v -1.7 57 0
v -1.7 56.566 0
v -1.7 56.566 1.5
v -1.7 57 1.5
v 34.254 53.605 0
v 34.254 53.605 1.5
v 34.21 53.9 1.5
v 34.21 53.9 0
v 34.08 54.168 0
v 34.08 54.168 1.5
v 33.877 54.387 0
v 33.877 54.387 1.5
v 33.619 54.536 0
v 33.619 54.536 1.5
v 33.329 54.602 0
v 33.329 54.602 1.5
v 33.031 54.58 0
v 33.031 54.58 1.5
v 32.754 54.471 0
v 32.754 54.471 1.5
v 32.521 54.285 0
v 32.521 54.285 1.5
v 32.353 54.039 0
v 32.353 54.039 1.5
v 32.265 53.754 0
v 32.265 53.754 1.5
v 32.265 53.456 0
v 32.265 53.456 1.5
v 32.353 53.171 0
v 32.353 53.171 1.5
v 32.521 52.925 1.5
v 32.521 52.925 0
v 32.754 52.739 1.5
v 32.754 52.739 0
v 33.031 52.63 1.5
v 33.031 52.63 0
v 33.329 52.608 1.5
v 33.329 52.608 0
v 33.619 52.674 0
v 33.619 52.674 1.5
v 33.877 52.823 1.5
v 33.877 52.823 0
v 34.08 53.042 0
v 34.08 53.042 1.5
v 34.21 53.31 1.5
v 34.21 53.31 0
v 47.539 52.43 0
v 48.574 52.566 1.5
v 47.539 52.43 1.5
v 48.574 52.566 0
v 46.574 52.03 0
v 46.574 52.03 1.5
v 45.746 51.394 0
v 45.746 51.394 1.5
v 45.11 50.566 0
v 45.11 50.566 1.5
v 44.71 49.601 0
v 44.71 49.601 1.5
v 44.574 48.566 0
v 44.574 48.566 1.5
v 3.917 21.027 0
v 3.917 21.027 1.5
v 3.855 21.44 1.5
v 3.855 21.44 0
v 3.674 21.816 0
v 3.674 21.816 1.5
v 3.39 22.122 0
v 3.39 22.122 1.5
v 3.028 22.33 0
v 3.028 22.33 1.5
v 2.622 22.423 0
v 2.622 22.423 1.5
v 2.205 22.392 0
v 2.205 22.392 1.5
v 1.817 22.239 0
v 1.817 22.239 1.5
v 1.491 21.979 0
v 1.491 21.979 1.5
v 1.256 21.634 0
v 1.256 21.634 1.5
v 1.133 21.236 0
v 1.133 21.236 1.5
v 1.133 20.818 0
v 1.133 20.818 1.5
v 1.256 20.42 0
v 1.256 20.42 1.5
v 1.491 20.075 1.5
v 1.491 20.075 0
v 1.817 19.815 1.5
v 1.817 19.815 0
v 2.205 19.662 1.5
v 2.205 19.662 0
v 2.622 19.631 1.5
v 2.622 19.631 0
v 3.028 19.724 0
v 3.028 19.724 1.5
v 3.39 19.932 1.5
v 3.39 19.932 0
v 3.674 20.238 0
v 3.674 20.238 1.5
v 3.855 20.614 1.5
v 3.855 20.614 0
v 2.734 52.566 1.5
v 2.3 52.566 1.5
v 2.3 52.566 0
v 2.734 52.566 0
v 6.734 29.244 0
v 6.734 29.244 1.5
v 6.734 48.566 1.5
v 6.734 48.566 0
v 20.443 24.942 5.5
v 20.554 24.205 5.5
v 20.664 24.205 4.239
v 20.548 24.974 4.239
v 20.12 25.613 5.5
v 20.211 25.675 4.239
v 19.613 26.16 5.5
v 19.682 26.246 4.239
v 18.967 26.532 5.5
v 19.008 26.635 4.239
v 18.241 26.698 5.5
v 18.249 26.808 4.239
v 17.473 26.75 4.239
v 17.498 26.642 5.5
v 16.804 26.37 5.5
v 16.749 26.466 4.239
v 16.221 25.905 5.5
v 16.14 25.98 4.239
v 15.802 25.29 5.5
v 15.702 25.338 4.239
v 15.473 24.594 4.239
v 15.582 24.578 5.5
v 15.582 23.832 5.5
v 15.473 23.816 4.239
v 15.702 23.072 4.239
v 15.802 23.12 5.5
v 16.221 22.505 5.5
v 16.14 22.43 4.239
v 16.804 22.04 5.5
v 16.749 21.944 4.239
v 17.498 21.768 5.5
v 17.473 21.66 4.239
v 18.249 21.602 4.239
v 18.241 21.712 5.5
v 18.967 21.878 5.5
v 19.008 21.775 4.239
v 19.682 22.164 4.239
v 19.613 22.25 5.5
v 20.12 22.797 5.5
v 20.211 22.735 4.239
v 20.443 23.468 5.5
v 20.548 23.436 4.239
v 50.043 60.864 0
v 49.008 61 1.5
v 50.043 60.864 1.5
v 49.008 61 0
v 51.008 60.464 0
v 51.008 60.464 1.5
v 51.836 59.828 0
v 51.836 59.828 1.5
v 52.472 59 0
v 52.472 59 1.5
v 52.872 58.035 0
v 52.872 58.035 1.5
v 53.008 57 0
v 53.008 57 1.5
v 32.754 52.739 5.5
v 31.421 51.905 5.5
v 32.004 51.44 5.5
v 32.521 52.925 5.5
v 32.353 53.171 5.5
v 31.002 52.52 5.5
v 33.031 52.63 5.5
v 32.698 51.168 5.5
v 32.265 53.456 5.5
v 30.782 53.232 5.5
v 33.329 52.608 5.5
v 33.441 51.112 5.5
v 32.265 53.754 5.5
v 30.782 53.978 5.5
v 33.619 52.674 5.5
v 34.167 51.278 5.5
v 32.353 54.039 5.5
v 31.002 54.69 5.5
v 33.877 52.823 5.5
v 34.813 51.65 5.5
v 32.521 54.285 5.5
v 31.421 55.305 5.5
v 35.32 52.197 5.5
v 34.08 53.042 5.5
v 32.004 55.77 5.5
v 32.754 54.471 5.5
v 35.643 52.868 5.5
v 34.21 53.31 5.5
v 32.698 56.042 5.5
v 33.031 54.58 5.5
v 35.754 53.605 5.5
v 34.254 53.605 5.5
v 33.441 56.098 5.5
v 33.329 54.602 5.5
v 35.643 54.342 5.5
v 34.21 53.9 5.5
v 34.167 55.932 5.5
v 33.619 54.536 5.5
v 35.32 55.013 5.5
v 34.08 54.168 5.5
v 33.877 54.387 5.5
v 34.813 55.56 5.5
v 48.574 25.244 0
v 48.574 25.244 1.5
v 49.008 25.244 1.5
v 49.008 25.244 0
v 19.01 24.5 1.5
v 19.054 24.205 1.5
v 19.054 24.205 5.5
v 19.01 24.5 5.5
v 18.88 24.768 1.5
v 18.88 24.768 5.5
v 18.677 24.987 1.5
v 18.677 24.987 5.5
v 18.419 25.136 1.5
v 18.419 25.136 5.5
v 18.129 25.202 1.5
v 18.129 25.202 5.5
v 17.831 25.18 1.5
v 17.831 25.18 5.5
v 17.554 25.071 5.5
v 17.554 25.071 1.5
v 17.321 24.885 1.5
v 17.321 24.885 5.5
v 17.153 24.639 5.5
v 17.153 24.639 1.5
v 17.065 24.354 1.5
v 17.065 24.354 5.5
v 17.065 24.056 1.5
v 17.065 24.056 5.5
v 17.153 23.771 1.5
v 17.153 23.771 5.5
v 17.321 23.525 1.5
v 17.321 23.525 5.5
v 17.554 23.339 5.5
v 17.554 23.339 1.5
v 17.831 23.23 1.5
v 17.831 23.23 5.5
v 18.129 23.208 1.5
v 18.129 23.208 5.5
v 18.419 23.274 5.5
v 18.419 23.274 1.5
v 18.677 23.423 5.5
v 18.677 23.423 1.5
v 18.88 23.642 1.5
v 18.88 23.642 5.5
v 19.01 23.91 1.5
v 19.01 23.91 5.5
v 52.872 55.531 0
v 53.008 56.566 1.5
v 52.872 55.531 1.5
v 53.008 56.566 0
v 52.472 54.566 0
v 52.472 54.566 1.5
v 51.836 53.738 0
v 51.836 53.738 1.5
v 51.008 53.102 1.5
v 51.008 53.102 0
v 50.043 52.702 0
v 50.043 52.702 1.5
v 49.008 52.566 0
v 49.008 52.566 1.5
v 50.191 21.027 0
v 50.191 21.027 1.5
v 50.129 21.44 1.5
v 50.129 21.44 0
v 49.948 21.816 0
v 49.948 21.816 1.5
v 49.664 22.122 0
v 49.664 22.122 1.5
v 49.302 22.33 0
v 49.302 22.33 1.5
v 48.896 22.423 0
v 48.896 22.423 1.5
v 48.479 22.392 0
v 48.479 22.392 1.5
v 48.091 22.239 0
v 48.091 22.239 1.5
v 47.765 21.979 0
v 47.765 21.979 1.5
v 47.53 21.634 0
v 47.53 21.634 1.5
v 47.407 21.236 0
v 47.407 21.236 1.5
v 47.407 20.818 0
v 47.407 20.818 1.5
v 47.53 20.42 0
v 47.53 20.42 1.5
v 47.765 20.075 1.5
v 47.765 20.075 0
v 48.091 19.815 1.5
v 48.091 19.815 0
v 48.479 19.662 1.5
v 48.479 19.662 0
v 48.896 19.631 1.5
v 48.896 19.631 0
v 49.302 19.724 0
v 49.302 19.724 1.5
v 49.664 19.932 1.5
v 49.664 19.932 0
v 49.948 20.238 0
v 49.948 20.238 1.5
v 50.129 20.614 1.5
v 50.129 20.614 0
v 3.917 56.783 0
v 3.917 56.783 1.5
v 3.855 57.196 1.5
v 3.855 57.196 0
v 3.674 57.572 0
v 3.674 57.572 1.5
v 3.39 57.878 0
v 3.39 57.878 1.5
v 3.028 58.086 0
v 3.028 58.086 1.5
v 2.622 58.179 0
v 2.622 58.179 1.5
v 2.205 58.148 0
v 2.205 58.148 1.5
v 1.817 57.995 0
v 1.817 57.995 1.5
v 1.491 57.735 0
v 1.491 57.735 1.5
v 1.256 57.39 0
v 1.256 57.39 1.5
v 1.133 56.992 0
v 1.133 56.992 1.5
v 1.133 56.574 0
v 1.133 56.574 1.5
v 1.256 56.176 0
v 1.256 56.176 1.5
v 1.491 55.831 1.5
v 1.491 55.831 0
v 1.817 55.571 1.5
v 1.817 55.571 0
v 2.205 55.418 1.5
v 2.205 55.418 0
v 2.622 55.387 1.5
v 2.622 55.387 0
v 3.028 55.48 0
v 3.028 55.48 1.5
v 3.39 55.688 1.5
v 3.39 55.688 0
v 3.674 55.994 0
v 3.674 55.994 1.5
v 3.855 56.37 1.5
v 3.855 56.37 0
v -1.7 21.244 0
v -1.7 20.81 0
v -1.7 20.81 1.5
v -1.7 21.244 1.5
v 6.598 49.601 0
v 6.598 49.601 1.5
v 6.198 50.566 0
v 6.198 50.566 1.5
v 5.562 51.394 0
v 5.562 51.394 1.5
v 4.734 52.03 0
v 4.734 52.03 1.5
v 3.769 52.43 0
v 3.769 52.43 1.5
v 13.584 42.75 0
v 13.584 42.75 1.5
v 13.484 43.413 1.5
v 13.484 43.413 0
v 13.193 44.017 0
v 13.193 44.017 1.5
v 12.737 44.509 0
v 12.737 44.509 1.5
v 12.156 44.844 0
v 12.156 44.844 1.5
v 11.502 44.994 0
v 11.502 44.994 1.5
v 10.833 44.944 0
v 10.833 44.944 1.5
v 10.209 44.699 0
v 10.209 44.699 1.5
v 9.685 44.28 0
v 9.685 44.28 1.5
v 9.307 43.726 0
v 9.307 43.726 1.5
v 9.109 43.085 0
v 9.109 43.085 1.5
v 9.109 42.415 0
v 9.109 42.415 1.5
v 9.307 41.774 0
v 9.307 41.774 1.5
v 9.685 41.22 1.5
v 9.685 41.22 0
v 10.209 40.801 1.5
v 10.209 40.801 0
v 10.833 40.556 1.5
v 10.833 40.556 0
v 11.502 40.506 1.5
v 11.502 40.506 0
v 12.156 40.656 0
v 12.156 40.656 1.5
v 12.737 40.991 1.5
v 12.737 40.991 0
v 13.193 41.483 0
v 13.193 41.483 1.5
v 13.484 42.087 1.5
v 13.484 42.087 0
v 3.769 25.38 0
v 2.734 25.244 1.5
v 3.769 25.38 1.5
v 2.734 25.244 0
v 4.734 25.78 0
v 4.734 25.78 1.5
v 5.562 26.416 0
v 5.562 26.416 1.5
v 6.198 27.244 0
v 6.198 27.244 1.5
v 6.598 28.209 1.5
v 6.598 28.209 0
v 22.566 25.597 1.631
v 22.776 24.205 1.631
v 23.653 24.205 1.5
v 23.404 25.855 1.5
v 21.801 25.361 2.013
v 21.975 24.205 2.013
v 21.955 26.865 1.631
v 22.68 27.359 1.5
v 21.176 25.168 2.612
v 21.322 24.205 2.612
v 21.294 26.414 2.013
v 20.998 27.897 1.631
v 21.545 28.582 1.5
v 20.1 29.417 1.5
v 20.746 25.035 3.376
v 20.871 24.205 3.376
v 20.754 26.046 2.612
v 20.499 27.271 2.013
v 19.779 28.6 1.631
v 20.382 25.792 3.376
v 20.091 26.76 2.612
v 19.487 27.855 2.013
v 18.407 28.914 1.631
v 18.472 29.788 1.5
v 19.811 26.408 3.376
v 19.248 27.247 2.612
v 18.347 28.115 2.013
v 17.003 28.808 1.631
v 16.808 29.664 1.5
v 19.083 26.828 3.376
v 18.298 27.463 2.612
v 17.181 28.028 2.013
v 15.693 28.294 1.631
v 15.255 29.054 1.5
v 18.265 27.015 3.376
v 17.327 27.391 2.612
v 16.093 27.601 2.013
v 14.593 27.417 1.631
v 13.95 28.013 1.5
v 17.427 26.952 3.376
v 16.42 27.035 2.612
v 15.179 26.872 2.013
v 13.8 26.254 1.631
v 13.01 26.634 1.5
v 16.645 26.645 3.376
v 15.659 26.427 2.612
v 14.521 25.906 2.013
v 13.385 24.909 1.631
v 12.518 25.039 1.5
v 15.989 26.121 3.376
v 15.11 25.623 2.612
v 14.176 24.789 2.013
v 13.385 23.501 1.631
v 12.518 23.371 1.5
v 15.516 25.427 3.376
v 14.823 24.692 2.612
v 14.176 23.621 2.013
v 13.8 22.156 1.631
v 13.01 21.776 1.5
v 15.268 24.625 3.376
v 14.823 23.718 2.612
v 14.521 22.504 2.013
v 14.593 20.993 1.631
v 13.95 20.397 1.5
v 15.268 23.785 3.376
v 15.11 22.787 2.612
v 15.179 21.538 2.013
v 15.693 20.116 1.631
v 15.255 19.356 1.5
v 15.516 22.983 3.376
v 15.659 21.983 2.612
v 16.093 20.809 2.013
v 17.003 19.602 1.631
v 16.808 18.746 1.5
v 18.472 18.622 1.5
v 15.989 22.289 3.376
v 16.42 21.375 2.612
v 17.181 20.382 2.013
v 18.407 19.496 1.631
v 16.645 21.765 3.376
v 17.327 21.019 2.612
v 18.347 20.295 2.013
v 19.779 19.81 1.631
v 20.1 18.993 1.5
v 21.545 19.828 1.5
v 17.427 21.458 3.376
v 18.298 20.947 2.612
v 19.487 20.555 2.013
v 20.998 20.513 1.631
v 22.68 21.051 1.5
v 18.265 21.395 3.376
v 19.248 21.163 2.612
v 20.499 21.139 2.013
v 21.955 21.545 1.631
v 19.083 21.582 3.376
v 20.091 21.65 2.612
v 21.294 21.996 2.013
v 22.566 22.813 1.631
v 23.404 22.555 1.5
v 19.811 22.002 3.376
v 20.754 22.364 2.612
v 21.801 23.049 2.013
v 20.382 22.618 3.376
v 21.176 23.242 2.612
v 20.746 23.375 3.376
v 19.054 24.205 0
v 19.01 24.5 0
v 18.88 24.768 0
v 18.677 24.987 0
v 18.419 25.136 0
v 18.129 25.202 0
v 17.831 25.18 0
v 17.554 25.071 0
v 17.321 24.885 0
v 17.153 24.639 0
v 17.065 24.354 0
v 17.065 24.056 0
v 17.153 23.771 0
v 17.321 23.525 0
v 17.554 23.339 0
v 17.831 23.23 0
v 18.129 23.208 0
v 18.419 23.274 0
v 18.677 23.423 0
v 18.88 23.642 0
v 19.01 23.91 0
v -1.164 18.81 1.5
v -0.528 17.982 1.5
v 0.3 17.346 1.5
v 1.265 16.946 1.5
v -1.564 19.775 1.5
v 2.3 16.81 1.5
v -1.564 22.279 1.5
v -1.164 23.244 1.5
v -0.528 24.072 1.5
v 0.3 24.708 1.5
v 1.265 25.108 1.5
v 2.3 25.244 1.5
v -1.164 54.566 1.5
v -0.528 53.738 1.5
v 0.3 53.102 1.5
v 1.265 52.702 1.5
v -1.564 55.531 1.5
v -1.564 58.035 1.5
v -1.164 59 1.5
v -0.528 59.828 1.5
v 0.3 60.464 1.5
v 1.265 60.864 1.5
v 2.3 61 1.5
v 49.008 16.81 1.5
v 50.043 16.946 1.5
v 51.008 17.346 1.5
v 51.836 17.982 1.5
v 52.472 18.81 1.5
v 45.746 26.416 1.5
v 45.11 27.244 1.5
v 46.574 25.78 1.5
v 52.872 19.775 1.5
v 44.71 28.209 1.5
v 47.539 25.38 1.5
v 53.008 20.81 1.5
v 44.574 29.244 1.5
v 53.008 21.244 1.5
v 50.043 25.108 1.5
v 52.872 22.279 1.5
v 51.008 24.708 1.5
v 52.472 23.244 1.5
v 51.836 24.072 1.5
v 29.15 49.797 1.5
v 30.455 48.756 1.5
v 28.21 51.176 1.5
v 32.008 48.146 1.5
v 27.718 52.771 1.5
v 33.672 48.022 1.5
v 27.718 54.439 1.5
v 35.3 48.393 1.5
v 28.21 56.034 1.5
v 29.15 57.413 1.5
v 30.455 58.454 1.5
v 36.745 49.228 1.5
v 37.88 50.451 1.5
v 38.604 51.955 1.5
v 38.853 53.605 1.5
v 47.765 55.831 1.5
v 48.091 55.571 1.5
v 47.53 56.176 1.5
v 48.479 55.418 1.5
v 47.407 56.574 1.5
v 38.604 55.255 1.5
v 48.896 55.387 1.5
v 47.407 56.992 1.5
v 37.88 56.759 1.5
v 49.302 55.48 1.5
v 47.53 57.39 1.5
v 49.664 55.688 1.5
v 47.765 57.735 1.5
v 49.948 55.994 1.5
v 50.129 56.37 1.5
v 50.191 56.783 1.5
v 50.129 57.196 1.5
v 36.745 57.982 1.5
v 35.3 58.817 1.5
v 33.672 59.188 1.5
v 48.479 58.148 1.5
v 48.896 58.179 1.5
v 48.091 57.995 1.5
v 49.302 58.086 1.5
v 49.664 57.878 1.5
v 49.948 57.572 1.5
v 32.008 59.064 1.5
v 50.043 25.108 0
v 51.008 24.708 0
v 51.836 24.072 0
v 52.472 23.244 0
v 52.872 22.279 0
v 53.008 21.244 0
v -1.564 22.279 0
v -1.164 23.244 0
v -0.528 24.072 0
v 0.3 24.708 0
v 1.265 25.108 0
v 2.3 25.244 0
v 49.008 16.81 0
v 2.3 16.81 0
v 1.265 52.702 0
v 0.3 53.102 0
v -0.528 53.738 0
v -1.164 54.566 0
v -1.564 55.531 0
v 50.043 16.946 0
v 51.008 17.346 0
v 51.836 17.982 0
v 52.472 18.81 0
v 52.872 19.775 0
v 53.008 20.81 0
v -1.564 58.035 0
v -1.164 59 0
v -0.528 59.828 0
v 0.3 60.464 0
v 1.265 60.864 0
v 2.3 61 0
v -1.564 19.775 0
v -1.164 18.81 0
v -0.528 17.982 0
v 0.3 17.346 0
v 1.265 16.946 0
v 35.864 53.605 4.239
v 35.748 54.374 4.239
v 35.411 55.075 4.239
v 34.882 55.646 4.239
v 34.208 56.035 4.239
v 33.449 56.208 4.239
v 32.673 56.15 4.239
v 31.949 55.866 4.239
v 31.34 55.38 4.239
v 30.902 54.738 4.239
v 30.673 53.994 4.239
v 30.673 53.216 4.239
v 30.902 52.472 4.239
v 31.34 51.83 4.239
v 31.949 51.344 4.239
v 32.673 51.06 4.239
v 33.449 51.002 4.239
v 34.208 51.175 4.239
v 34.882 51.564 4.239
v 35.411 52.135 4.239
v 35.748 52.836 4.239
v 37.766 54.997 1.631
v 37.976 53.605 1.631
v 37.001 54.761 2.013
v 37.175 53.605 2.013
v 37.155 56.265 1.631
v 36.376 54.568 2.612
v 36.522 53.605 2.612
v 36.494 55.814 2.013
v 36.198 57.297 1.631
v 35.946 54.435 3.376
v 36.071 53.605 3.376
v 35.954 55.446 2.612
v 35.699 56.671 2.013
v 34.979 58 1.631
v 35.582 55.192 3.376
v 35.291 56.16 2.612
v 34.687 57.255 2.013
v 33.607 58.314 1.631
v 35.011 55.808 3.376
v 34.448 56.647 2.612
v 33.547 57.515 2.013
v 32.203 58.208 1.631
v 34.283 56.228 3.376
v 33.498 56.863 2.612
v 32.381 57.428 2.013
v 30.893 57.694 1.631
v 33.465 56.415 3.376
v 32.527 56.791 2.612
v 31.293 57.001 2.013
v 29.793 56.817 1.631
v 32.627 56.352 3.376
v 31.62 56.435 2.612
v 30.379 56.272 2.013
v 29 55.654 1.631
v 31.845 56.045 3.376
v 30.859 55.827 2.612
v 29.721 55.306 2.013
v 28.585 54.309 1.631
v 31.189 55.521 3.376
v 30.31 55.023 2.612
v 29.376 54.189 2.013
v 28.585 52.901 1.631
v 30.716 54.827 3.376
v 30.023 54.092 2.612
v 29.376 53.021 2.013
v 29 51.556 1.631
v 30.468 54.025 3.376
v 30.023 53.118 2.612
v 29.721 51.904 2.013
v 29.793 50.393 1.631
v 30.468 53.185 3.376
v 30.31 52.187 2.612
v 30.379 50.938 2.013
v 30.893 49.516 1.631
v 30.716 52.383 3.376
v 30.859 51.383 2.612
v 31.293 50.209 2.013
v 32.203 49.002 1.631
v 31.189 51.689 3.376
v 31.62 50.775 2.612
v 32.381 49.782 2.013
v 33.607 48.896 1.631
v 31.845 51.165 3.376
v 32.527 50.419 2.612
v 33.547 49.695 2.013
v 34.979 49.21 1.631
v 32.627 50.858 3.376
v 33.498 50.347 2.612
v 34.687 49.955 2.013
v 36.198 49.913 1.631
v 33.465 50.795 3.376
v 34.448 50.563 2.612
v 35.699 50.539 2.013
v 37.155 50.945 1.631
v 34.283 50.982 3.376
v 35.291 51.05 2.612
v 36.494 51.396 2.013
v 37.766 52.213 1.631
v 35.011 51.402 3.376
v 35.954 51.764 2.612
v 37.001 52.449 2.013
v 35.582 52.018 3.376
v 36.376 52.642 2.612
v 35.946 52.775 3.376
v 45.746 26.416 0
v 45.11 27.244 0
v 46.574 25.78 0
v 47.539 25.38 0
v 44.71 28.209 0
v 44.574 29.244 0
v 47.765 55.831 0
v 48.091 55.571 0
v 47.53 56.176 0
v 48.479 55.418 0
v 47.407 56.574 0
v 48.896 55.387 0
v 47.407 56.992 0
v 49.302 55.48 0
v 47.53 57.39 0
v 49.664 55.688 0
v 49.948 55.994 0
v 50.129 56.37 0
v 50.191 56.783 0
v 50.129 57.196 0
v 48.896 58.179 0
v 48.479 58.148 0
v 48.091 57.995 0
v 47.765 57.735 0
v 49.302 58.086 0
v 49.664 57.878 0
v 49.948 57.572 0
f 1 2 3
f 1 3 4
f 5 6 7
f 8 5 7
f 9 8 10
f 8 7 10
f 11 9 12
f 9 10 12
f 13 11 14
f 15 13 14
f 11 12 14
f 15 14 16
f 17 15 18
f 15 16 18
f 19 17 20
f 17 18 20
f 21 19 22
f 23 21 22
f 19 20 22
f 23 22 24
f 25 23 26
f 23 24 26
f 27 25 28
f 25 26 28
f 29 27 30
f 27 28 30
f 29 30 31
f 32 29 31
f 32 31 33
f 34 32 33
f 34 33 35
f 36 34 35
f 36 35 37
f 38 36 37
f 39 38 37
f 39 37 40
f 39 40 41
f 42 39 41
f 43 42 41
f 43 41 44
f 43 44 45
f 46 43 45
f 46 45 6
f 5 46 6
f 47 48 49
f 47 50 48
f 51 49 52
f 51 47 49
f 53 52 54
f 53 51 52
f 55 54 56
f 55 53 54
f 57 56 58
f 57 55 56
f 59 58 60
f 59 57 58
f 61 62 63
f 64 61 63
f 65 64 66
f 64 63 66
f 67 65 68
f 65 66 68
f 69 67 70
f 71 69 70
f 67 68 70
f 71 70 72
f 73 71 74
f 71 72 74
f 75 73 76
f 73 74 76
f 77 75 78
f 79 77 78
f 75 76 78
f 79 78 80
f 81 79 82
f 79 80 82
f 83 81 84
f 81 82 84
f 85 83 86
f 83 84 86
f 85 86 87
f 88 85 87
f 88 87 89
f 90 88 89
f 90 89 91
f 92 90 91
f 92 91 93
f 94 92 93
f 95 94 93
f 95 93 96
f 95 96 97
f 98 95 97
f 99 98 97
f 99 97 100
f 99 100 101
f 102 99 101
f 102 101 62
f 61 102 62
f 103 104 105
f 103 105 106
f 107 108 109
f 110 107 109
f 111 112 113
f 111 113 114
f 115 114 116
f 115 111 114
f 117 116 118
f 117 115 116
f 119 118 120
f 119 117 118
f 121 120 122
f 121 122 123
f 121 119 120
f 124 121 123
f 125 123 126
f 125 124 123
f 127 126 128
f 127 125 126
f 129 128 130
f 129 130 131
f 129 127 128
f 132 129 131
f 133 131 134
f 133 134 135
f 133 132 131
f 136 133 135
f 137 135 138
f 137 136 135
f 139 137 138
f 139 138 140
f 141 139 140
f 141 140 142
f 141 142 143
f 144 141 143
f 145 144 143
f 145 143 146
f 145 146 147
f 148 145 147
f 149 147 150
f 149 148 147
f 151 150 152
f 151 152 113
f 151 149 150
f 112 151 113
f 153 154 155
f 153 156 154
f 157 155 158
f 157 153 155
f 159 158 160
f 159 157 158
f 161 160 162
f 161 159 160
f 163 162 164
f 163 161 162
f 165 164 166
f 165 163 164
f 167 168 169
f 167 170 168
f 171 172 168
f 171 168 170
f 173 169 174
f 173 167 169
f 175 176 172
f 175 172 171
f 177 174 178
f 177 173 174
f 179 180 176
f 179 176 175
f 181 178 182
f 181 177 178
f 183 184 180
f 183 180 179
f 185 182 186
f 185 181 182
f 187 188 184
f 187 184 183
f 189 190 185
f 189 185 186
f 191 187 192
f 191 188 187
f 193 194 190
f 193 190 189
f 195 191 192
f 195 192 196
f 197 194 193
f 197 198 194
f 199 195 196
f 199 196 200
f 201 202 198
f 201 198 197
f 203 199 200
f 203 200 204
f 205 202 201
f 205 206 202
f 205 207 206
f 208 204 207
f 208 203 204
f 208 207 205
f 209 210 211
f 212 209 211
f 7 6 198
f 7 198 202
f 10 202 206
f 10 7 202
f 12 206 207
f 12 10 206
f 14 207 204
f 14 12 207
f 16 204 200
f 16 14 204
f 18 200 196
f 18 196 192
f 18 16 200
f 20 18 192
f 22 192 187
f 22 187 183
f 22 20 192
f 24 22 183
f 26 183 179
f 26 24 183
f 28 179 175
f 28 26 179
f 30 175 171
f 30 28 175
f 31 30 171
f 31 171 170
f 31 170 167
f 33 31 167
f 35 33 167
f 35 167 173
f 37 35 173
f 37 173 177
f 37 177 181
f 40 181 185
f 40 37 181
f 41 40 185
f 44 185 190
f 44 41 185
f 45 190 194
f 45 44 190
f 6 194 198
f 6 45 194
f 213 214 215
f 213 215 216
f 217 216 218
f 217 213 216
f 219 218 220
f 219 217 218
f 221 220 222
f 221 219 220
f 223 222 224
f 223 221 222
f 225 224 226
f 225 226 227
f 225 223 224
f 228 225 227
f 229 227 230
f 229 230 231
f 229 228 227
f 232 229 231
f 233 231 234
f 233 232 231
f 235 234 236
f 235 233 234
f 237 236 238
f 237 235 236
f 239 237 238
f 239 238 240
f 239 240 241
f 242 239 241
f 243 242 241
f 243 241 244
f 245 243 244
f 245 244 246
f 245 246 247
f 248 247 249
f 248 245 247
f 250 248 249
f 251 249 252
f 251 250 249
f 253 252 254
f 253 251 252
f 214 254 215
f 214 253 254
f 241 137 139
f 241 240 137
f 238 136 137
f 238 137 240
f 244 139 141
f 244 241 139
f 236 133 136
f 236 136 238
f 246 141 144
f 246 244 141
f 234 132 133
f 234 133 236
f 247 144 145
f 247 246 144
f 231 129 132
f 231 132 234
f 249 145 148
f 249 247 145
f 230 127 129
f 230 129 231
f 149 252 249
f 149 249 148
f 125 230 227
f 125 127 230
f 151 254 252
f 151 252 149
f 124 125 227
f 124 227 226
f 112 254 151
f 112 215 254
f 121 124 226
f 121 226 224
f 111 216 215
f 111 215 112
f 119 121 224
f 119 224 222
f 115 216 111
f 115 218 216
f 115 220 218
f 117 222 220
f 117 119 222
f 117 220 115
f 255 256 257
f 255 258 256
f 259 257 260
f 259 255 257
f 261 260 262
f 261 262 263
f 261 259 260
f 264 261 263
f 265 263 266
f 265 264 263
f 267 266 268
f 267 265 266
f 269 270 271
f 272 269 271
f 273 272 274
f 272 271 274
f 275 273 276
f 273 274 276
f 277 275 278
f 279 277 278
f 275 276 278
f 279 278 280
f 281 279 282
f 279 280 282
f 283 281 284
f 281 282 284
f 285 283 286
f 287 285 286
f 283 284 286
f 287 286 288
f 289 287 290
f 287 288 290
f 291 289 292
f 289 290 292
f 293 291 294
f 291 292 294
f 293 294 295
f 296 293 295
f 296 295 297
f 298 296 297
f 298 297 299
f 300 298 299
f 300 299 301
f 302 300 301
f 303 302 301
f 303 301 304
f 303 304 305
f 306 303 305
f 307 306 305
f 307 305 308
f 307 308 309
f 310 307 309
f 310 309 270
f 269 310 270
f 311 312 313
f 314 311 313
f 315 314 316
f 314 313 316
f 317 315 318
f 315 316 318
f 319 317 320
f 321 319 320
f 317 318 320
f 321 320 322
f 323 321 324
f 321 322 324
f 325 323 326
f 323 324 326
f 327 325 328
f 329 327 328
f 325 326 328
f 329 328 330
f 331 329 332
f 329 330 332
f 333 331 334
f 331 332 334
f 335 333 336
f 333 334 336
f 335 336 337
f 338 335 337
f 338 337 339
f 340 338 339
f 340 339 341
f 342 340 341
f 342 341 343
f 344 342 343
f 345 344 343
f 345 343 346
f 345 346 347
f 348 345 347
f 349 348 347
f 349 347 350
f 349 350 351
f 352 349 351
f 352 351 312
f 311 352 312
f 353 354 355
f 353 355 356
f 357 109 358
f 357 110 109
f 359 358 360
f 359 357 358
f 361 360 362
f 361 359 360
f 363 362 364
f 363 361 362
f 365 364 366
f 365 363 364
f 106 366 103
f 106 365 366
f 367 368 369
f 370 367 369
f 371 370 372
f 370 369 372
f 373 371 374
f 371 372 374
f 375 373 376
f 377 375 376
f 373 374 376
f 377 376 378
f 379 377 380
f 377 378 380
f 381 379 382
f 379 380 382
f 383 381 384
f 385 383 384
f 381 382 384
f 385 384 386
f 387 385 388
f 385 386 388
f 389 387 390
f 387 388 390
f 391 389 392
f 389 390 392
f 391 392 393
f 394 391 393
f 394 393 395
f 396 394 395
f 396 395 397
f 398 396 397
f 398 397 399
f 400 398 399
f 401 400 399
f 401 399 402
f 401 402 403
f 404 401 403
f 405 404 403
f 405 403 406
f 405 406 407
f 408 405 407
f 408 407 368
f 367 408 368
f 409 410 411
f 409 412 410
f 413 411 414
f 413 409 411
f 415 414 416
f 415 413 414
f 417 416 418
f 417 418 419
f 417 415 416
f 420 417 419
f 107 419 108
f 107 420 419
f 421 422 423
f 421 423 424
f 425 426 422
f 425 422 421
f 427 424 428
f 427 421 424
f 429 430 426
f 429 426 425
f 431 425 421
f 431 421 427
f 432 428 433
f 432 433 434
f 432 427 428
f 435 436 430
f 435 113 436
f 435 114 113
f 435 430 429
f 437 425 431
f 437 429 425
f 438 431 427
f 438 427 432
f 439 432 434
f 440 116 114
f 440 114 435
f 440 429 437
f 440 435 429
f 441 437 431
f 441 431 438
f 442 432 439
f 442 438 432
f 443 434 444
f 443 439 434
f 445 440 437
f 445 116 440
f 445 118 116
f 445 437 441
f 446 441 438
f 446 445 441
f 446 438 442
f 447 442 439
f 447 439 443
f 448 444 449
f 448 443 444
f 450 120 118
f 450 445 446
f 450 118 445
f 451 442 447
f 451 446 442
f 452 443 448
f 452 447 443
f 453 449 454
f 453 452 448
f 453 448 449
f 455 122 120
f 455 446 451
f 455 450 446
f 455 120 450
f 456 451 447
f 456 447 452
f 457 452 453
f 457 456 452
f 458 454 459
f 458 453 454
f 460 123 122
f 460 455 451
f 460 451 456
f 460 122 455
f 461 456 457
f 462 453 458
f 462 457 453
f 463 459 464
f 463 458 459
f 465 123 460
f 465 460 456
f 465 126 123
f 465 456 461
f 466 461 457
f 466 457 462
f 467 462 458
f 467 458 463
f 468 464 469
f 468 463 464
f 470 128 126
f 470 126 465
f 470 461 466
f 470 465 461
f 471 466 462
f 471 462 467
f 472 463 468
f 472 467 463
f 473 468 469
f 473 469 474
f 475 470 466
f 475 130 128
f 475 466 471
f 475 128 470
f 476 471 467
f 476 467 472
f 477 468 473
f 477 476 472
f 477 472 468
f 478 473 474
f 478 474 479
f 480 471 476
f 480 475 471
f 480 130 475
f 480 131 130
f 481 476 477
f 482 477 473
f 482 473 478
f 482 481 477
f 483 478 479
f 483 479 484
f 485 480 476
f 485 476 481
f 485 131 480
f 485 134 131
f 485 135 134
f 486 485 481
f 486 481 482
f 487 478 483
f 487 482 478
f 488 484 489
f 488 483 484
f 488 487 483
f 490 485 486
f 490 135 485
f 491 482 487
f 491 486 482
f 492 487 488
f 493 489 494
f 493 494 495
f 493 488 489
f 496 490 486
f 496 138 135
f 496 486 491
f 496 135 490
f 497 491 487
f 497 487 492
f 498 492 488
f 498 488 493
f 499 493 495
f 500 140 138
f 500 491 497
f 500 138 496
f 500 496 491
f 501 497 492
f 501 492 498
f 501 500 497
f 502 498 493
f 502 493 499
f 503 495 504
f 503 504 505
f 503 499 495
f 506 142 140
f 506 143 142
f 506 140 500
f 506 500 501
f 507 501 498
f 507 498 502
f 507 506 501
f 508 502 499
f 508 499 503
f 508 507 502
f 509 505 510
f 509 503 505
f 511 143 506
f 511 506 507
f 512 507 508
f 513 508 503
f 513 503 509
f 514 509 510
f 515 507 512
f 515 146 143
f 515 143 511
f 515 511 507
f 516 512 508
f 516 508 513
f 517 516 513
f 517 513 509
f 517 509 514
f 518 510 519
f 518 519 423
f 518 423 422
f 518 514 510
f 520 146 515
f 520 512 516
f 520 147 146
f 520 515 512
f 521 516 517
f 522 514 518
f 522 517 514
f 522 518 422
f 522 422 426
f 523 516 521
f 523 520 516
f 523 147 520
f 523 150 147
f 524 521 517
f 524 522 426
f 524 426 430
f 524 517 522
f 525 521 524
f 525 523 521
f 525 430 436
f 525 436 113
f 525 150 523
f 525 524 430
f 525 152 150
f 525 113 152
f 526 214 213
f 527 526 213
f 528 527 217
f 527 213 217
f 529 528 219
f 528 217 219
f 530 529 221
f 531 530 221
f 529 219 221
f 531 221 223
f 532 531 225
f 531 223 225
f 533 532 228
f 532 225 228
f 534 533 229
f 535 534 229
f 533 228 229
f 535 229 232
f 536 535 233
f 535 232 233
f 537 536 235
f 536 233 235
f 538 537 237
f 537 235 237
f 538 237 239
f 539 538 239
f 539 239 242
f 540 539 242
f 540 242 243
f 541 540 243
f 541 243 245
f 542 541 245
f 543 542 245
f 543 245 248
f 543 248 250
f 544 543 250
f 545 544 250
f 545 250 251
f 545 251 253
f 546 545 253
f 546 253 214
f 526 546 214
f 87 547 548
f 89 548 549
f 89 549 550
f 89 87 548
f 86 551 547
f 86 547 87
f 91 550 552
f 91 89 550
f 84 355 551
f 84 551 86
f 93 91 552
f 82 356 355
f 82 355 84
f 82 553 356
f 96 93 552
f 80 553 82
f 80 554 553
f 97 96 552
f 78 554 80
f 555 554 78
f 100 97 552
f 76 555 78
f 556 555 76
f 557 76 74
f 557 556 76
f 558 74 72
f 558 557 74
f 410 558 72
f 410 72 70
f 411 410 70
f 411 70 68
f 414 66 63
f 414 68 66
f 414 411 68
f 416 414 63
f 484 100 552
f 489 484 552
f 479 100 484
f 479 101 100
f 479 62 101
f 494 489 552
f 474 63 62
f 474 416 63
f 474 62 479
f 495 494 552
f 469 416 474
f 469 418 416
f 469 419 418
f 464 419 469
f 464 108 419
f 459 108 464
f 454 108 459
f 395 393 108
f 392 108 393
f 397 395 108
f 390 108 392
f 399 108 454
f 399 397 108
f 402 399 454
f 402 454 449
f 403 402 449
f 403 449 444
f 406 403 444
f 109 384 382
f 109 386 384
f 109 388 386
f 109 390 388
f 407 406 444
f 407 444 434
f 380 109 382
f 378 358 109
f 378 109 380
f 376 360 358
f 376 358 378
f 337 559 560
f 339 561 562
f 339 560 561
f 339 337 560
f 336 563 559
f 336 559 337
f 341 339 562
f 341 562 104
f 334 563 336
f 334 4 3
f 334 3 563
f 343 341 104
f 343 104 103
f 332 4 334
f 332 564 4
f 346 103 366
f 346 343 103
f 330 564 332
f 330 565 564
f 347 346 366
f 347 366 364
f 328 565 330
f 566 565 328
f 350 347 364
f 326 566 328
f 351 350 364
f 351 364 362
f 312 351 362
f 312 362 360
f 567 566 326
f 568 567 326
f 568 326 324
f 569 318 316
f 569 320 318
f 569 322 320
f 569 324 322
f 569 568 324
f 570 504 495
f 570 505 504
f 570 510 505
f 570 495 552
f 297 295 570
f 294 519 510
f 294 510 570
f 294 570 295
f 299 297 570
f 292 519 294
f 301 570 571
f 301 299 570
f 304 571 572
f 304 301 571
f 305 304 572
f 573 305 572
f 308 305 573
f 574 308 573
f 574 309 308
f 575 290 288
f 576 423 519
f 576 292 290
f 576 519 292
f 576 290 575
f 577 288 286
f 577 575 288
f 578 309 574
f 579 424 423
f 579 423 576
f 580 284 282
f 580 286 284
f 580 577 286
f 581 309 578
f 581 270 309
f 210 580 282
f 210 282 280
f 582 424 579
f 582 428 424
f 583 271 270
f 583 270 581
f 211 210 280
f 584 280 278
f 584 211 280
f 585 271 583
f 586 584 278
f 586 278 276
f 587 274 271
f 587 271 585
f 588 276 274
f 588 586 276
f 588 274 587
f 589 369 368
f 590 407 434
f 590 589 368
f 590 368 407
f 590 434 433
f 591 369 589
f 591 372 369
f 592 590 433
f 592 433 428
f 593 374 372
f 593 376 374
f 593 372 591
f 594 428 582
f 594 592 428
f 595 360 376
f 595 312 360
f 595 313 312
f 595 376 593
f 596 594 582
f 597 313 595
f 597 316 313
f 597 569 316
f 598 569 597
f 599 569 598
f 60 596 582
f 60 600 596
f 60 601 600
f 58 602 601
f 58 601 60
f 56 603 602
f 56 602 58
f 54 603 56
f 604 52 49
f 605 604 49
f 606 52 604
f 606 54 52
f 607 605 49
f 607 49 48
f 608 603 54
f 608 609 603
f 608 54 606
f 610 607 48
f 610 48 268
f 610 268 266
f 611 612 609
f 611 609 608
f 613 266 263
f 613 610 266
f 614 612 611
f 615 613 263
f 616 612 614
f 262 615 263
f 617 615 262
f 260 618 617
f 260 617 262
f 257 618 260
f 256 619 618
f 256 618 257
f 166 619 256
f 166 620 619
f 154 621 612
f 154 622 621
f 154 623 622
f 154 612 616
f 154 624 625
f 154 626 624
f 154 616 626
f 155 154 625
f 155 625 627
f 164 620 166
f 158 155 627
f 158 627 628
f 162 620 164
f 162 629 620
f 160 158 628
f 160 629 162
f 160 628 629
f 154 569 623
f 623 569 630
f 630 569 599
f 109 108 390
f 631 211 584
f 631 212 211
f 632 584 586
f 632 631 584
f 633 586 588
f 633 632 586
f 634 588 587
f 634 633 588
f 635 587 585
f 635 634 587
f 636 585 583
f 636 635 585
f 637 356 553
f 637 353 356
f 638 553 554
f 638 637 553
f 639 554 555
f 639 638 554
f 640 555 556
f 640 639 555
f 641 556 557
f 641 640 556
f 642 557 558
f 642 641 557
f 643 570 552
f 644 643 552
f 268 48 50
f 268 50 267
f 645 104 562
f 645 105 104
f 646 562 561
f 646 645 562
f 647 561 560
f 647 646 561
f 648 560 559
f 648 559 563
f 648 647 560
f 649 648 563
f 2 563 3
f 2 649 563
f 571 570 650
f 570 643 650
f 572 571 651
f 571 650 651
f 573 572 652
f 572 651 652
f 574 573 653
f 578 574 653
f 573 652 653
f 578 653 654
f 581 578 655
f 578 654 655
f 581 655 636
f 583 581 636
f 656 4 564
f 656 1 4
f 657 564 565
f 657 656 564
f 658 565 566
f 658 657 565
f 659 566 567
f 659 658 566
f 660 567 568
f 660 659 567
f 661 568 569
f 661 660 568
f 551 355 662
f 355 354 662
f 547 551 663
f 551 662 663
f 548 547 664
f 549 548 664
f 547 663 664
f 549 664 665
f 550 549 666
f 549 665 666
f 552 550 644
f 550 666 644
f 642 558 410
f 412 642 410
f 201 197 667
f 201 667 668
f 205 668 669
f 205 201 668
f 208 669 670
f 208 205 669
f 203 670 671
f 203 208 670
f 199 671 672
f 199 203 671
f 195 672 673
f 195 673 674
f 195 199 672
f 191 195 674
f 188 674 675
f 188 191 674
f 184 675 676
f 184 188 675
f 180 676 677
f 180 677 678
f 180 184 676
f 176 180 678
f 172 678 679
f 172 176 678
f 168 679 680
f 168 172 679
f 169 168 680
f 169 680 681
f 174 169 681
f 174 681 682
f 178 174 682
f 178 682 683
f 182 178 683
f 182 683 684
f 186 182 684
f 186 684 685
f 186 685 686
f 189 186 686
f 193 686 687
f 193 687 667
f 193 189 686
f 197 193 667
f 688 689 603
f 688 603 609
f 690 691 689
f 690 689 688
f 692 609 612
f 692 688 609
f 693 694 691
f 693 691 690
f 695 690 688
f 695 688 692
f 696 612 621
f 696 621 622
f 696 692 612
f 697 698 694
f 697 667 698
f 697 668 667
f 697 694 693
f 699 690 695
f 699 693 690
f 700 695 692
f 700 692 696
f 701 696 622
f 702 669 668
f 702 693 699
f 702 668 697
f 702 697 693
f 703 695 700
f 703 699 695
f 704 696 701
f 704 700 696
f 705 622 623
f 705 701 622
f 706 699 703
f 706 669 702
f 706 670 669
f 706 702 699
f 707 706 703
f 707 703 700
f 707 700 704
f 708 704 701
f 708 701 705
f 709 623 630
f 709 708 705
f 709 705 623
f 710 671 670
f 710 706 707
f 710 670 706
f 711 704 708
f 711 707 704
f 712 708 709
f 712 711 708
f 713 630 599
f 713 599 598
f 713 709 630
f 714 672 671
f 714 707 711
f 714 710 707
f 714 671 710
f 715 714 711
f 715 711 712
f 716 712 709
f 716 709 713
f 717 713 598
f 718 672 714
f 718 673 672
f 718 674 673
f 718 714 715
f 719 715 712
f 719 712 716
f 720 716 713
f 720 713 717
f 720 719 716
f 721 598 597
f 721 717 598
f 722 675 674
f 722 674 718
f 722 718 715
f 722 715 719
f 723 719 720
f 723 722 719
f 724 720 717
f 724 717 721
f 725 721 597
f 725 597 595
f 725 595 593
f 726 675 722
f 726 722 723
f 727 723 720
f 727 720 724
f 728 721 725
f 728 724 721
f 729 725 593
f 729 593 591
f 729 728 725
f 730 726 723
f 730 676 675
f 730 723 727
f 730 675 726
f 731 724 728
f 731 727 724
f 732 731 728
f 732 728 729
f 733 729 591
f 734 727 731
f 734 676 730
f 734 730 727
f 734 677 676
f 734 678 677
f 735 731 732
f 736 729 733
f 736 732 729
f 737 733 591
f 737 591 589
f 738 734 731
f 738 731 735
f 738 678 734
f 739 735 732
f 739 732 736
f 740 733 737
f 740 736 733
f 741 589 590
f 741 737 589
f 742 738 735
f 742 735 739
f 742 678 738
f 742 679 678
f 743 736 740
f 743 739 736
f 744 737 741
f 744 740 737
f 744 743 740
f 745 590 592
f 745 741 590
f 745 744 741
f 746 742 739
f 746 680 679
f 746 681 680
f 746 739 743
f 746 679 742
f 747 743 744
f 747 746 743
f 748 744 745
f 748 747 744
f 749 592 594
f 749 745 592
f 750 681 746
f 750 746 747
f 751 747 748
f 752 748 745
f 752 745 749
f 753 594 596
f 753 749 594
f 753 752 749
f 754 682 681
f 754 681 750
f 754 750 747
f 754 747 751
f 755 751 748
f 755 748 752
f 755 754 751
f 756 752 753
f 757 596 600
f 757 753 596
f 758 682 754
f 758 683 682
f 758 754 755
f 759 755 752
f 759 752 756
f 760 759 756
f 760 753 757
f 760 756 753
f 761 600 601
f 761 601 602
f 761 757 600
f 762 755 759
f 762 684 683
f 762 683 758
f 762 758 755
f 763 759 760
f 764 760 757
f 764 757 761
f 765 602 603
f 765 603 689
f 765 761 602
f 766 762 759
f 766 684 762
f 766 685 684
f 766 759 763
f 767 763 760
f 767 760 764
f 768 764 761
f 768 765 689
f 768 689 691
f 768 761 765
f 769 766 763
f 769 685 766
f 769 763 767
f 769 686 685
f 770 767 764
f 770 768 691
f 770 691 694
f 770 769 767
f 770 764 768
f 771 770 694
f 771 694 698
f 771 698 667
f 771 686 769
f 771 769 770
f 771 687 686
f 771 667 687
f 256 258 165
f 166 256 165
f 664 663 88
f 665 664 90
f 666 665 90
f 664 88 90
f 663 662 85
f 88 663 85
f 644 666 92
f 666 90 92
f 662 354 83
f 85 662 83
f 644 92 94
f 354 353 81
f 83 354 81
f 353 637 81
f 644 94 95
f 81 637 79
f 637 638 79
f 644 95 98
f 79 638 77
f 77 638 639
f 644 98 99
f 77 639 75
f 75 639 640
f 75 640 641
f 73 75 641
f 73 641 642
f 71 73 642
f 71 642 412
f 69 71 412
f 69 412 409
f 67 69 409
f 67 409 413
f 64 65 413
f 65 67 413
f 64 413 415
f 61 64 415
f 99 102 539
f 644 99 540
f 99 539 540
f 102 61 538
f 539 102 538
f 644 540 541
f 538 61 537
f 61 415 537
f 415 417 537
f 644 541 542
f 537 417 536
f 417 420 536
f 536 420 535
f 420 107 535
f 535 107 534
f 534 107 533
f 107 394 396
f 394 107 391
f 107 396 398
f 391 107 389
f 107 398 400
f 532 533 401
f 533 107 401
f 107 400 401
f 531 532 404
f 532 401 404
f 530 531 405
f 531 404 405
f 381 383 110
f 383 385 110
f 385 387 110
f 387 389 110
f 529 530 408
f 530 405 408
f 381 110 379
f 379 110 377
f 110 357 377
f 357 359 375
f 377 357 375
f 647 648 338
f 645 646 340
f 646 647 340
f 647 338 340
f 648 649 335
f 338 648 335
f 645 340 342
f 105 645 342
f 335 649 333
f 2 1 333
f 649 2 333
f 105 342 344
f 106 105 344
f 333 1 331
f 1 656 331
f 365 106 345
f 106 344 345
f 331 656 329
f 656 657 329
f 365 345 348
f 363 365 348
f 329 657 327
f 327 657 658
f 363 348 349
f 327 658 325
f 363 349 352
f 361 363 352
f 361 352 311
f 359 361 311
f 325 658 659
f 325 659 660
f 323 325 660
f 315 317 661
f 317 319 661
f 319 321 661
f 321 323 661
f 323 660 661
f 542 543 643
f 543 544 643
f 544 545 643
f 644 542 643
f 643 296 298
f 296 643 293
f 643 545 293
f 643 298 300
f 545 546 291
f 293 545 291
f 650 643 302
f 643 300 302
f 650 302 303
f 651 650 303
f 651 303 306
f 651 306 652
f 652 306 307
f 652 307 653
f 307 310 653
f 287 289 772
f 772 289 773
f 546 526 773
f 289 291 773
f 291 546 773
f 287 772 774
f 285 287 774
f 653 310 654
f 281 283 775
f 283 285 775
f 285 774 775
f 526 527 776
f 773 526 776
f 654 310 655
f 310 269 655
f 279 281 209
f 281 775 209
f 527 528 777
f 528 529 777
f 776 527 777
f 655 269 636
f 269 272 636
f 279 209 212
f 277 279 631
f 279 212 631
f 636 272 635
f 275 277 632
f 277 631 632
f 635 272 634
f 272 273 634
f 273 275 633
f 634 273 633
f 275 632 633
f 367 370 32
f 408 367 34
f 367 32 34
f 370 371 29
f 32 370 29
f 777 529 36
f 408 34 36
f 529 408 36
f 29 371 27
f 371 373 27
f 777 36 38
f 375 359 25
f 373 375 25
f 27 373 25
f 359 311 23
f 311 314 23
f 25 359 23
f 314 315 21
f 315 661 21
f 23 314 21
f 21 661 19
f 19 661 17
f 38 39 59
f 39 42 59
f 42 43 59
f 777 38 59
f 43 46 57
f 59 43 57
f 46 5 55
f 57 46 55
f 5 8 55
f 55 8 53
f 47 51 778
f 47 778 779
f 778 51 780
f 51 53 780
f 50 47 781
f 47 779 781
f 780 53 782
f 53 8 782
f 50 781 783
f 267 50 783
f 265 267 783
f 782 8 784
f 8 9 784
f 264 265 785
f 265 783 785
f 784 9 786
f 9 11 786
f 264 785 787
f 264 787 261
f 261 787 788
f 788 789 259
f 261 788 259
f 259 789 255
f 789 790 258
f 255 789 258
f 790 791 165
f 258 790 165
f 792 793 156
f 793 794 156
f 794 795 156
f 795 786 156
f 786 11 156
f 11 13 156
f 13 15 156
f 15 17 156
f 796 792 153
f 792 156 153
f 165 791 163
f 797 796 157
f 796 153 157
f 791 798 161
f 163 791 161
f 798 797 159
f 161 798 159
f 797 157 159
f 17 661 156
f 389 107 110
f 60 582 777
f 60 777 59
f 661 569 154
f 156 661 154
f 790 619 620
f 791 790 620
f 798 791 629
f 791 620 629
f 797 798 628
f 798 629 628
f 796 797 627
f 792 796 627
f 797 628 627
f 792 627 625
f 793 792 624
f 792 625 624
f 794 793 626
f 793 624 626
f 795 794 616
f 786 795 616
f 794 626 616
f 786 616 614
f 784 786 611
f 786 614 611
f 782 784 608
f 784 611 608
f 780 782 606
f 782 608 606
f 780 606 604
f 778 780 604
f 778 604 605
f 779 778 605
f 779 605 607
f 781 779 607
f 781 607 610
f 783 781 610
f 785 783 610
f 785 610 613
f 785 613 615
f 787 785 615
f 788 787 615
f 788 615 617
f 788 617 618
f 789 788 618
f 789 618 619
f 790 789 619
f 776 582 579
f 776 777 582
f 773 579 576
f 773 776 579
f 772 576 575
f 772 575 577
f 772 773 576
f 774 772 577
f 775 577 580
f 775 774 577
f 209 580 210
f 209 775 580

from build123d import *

# Parameters (mm, degrees)
F1_W     = 54.708
F1_H     = 77.4
F2_DEPTH = 1.5
F3_W     = 8.434
F3_H     = 27.322
F3_R     = 1.4
F3_R_2   = 1
F3_R_3   = 2.25
F4_DEPTH = 1.501
F5_R     = 4
F6_R     = 3
F6_R_2   = 1
F7_DEPTH = 4
F9_R     = 3


# Not quite as in the source:
# - a fillet or chamfer that OpenCascade refuses, or shapes differently, is made with other operations: its cross-section is extruded or revolved along the edge and cut away or added


with BuildPart() as f2:
    # F1 (on face) → F2 (new body)
    with BuildSketch(Plane.XY):
        with Locations((25.654, 37)):
            Rectangle(F1_W, F1_H)
    extrude(amount=F2_DEPTH)

    # F3 (on face) → F4 (cut, through all)
    with BuildSketch(Plane.XY.offset(1.5)):
        Polygon((44.574, 16.81), (6.734, 16.81), (-1.7, 16.81), (-1.7, -1.7), (53.008, -1.7), (53.008, 16.81), align=None)
        with Locations((2.517, 38.905)):
            Rectangle(F3_W, F3_H)
        with Locations((48.791, 38.905)):
            Rectangle(F3_W, F3_H)
        Polygon((-1.7, 61), (6.734, 61), (44.574, 61), (53.008, 61), (53.008, 75.7), (-1.7, 75.7), align=None)
        with Locations((2.517, 21.027)):
            Circle(F3_R)
        with Locations((48.791, 21.027)):
            Circle(F3_R)
        with Locations((48.791, 56.783)):
            Circle(F3_R)
        with Locations((2.517, 56.783)):
            Circle(F3_R)
        with Locations((33.254, 53.605)):
            Circle(F3_R_2)
        with Locations((18.054, 24.205)):
            Circle(F3_R_2)
        with Locations((11.334, 42.75)):
            Circle(F3_R_3)
    extrude(amount=-F4_DEPTH, mode=Mode.SUBTRACT)

    # F5
    f5_edges = [f2.edges().sort_by_distance(p)[0] for p in [
        (-1.7, 61, 0.75),
        (-1.7, 52.566, 0.75),
        (-1.7, 25.244, 0.75),
        (-1.7, 16.81, 0.75),
        (6.734, 25.244, 0.75),
        (6.734, 52.566, 0.75),
        (53.008, 61, 0.75),
        (53.008, 52.566, 0.75),
        (44.574, 52.566, 0.75),
        (44.574, 25.244, 0.75),
        (53.008, 25.244, 0.75),
        (53.008, 16.81, 0.75),
    ]]
    fillet(f5_edges, radius=F5_R)

    # F6 (on face) → F7 (join)
    with BuildSketch(Plane.XY.offset(1.5)):
        with Locations((18.054, 24.205)):
            Circle(F6_R)
        with Locations((18.054, 24.205)):
            Circle(F6_R_2, mode=Mode.SUBTRACT)
        with Locations((33.254, 53.605)):
            Circle(F6_R)
        with Locations((33.254, 53.605)):
            Circle(F6_R_2, mode=Mode.SUBTRACT)
    extrude(amount=F7_DEPTH)

    # F8: chamfer of 0.5 x 5.7150261514 on 2 edges, made by hand


with BuildPart() as f8_tool2:
    # F8_s3 → F8_t4 (revolve)
    with BuildSketch(Plane.XZ.offset(-24.205)):
        Polygon((21.054, -0.2150261514), (20.554, 5.5), (21.054, 5.5), align=None)
    revolve(axis=Axis((18.054, 24.205, 5.5), (0, 0, 1)))

    split(bisect_by=Plane.XY.offset(1.5), keep=Keep.TOP)


with BuildPart() as f2_1:
    add(f2.part)

    # F8_t1: cut F8_tool2
    add(f8_tool2.part, mode=Mode.SUBTRACT)


with BuildPart() as f8_tool7:
    # F8_s8 → F8_t9 (revolve)
    with BuildSketch(Plane.XZ.offset(-53.605)):
        Polygon((36.254, -0.2150261514), (35.754, 5.5), (36.254, 5.5), align=None)
    revolve(axis=Axis((33.254, 53.605, 5.5), (0, 0, 1)))

    split(bisect_by=Plane.XY.offset(1.5), keep=Keep.TOP)


with BuildPart() as f2_2:
    add(f2_1.part)

    # F8_t6: cut F8_tool7
    add(f8_tool7.part, mode=Mode.SUBTRACT)

    # F9
    f9_edges = [f2_2.edges().sort_by_distance(p)[0] for p in [
        (15.204045, 24.205, 1.5),
        (30.404045, 53.605, 1.5),
    ]]
    fillet(f9_edges, radius=F9_R)


solid = f2_2.part
